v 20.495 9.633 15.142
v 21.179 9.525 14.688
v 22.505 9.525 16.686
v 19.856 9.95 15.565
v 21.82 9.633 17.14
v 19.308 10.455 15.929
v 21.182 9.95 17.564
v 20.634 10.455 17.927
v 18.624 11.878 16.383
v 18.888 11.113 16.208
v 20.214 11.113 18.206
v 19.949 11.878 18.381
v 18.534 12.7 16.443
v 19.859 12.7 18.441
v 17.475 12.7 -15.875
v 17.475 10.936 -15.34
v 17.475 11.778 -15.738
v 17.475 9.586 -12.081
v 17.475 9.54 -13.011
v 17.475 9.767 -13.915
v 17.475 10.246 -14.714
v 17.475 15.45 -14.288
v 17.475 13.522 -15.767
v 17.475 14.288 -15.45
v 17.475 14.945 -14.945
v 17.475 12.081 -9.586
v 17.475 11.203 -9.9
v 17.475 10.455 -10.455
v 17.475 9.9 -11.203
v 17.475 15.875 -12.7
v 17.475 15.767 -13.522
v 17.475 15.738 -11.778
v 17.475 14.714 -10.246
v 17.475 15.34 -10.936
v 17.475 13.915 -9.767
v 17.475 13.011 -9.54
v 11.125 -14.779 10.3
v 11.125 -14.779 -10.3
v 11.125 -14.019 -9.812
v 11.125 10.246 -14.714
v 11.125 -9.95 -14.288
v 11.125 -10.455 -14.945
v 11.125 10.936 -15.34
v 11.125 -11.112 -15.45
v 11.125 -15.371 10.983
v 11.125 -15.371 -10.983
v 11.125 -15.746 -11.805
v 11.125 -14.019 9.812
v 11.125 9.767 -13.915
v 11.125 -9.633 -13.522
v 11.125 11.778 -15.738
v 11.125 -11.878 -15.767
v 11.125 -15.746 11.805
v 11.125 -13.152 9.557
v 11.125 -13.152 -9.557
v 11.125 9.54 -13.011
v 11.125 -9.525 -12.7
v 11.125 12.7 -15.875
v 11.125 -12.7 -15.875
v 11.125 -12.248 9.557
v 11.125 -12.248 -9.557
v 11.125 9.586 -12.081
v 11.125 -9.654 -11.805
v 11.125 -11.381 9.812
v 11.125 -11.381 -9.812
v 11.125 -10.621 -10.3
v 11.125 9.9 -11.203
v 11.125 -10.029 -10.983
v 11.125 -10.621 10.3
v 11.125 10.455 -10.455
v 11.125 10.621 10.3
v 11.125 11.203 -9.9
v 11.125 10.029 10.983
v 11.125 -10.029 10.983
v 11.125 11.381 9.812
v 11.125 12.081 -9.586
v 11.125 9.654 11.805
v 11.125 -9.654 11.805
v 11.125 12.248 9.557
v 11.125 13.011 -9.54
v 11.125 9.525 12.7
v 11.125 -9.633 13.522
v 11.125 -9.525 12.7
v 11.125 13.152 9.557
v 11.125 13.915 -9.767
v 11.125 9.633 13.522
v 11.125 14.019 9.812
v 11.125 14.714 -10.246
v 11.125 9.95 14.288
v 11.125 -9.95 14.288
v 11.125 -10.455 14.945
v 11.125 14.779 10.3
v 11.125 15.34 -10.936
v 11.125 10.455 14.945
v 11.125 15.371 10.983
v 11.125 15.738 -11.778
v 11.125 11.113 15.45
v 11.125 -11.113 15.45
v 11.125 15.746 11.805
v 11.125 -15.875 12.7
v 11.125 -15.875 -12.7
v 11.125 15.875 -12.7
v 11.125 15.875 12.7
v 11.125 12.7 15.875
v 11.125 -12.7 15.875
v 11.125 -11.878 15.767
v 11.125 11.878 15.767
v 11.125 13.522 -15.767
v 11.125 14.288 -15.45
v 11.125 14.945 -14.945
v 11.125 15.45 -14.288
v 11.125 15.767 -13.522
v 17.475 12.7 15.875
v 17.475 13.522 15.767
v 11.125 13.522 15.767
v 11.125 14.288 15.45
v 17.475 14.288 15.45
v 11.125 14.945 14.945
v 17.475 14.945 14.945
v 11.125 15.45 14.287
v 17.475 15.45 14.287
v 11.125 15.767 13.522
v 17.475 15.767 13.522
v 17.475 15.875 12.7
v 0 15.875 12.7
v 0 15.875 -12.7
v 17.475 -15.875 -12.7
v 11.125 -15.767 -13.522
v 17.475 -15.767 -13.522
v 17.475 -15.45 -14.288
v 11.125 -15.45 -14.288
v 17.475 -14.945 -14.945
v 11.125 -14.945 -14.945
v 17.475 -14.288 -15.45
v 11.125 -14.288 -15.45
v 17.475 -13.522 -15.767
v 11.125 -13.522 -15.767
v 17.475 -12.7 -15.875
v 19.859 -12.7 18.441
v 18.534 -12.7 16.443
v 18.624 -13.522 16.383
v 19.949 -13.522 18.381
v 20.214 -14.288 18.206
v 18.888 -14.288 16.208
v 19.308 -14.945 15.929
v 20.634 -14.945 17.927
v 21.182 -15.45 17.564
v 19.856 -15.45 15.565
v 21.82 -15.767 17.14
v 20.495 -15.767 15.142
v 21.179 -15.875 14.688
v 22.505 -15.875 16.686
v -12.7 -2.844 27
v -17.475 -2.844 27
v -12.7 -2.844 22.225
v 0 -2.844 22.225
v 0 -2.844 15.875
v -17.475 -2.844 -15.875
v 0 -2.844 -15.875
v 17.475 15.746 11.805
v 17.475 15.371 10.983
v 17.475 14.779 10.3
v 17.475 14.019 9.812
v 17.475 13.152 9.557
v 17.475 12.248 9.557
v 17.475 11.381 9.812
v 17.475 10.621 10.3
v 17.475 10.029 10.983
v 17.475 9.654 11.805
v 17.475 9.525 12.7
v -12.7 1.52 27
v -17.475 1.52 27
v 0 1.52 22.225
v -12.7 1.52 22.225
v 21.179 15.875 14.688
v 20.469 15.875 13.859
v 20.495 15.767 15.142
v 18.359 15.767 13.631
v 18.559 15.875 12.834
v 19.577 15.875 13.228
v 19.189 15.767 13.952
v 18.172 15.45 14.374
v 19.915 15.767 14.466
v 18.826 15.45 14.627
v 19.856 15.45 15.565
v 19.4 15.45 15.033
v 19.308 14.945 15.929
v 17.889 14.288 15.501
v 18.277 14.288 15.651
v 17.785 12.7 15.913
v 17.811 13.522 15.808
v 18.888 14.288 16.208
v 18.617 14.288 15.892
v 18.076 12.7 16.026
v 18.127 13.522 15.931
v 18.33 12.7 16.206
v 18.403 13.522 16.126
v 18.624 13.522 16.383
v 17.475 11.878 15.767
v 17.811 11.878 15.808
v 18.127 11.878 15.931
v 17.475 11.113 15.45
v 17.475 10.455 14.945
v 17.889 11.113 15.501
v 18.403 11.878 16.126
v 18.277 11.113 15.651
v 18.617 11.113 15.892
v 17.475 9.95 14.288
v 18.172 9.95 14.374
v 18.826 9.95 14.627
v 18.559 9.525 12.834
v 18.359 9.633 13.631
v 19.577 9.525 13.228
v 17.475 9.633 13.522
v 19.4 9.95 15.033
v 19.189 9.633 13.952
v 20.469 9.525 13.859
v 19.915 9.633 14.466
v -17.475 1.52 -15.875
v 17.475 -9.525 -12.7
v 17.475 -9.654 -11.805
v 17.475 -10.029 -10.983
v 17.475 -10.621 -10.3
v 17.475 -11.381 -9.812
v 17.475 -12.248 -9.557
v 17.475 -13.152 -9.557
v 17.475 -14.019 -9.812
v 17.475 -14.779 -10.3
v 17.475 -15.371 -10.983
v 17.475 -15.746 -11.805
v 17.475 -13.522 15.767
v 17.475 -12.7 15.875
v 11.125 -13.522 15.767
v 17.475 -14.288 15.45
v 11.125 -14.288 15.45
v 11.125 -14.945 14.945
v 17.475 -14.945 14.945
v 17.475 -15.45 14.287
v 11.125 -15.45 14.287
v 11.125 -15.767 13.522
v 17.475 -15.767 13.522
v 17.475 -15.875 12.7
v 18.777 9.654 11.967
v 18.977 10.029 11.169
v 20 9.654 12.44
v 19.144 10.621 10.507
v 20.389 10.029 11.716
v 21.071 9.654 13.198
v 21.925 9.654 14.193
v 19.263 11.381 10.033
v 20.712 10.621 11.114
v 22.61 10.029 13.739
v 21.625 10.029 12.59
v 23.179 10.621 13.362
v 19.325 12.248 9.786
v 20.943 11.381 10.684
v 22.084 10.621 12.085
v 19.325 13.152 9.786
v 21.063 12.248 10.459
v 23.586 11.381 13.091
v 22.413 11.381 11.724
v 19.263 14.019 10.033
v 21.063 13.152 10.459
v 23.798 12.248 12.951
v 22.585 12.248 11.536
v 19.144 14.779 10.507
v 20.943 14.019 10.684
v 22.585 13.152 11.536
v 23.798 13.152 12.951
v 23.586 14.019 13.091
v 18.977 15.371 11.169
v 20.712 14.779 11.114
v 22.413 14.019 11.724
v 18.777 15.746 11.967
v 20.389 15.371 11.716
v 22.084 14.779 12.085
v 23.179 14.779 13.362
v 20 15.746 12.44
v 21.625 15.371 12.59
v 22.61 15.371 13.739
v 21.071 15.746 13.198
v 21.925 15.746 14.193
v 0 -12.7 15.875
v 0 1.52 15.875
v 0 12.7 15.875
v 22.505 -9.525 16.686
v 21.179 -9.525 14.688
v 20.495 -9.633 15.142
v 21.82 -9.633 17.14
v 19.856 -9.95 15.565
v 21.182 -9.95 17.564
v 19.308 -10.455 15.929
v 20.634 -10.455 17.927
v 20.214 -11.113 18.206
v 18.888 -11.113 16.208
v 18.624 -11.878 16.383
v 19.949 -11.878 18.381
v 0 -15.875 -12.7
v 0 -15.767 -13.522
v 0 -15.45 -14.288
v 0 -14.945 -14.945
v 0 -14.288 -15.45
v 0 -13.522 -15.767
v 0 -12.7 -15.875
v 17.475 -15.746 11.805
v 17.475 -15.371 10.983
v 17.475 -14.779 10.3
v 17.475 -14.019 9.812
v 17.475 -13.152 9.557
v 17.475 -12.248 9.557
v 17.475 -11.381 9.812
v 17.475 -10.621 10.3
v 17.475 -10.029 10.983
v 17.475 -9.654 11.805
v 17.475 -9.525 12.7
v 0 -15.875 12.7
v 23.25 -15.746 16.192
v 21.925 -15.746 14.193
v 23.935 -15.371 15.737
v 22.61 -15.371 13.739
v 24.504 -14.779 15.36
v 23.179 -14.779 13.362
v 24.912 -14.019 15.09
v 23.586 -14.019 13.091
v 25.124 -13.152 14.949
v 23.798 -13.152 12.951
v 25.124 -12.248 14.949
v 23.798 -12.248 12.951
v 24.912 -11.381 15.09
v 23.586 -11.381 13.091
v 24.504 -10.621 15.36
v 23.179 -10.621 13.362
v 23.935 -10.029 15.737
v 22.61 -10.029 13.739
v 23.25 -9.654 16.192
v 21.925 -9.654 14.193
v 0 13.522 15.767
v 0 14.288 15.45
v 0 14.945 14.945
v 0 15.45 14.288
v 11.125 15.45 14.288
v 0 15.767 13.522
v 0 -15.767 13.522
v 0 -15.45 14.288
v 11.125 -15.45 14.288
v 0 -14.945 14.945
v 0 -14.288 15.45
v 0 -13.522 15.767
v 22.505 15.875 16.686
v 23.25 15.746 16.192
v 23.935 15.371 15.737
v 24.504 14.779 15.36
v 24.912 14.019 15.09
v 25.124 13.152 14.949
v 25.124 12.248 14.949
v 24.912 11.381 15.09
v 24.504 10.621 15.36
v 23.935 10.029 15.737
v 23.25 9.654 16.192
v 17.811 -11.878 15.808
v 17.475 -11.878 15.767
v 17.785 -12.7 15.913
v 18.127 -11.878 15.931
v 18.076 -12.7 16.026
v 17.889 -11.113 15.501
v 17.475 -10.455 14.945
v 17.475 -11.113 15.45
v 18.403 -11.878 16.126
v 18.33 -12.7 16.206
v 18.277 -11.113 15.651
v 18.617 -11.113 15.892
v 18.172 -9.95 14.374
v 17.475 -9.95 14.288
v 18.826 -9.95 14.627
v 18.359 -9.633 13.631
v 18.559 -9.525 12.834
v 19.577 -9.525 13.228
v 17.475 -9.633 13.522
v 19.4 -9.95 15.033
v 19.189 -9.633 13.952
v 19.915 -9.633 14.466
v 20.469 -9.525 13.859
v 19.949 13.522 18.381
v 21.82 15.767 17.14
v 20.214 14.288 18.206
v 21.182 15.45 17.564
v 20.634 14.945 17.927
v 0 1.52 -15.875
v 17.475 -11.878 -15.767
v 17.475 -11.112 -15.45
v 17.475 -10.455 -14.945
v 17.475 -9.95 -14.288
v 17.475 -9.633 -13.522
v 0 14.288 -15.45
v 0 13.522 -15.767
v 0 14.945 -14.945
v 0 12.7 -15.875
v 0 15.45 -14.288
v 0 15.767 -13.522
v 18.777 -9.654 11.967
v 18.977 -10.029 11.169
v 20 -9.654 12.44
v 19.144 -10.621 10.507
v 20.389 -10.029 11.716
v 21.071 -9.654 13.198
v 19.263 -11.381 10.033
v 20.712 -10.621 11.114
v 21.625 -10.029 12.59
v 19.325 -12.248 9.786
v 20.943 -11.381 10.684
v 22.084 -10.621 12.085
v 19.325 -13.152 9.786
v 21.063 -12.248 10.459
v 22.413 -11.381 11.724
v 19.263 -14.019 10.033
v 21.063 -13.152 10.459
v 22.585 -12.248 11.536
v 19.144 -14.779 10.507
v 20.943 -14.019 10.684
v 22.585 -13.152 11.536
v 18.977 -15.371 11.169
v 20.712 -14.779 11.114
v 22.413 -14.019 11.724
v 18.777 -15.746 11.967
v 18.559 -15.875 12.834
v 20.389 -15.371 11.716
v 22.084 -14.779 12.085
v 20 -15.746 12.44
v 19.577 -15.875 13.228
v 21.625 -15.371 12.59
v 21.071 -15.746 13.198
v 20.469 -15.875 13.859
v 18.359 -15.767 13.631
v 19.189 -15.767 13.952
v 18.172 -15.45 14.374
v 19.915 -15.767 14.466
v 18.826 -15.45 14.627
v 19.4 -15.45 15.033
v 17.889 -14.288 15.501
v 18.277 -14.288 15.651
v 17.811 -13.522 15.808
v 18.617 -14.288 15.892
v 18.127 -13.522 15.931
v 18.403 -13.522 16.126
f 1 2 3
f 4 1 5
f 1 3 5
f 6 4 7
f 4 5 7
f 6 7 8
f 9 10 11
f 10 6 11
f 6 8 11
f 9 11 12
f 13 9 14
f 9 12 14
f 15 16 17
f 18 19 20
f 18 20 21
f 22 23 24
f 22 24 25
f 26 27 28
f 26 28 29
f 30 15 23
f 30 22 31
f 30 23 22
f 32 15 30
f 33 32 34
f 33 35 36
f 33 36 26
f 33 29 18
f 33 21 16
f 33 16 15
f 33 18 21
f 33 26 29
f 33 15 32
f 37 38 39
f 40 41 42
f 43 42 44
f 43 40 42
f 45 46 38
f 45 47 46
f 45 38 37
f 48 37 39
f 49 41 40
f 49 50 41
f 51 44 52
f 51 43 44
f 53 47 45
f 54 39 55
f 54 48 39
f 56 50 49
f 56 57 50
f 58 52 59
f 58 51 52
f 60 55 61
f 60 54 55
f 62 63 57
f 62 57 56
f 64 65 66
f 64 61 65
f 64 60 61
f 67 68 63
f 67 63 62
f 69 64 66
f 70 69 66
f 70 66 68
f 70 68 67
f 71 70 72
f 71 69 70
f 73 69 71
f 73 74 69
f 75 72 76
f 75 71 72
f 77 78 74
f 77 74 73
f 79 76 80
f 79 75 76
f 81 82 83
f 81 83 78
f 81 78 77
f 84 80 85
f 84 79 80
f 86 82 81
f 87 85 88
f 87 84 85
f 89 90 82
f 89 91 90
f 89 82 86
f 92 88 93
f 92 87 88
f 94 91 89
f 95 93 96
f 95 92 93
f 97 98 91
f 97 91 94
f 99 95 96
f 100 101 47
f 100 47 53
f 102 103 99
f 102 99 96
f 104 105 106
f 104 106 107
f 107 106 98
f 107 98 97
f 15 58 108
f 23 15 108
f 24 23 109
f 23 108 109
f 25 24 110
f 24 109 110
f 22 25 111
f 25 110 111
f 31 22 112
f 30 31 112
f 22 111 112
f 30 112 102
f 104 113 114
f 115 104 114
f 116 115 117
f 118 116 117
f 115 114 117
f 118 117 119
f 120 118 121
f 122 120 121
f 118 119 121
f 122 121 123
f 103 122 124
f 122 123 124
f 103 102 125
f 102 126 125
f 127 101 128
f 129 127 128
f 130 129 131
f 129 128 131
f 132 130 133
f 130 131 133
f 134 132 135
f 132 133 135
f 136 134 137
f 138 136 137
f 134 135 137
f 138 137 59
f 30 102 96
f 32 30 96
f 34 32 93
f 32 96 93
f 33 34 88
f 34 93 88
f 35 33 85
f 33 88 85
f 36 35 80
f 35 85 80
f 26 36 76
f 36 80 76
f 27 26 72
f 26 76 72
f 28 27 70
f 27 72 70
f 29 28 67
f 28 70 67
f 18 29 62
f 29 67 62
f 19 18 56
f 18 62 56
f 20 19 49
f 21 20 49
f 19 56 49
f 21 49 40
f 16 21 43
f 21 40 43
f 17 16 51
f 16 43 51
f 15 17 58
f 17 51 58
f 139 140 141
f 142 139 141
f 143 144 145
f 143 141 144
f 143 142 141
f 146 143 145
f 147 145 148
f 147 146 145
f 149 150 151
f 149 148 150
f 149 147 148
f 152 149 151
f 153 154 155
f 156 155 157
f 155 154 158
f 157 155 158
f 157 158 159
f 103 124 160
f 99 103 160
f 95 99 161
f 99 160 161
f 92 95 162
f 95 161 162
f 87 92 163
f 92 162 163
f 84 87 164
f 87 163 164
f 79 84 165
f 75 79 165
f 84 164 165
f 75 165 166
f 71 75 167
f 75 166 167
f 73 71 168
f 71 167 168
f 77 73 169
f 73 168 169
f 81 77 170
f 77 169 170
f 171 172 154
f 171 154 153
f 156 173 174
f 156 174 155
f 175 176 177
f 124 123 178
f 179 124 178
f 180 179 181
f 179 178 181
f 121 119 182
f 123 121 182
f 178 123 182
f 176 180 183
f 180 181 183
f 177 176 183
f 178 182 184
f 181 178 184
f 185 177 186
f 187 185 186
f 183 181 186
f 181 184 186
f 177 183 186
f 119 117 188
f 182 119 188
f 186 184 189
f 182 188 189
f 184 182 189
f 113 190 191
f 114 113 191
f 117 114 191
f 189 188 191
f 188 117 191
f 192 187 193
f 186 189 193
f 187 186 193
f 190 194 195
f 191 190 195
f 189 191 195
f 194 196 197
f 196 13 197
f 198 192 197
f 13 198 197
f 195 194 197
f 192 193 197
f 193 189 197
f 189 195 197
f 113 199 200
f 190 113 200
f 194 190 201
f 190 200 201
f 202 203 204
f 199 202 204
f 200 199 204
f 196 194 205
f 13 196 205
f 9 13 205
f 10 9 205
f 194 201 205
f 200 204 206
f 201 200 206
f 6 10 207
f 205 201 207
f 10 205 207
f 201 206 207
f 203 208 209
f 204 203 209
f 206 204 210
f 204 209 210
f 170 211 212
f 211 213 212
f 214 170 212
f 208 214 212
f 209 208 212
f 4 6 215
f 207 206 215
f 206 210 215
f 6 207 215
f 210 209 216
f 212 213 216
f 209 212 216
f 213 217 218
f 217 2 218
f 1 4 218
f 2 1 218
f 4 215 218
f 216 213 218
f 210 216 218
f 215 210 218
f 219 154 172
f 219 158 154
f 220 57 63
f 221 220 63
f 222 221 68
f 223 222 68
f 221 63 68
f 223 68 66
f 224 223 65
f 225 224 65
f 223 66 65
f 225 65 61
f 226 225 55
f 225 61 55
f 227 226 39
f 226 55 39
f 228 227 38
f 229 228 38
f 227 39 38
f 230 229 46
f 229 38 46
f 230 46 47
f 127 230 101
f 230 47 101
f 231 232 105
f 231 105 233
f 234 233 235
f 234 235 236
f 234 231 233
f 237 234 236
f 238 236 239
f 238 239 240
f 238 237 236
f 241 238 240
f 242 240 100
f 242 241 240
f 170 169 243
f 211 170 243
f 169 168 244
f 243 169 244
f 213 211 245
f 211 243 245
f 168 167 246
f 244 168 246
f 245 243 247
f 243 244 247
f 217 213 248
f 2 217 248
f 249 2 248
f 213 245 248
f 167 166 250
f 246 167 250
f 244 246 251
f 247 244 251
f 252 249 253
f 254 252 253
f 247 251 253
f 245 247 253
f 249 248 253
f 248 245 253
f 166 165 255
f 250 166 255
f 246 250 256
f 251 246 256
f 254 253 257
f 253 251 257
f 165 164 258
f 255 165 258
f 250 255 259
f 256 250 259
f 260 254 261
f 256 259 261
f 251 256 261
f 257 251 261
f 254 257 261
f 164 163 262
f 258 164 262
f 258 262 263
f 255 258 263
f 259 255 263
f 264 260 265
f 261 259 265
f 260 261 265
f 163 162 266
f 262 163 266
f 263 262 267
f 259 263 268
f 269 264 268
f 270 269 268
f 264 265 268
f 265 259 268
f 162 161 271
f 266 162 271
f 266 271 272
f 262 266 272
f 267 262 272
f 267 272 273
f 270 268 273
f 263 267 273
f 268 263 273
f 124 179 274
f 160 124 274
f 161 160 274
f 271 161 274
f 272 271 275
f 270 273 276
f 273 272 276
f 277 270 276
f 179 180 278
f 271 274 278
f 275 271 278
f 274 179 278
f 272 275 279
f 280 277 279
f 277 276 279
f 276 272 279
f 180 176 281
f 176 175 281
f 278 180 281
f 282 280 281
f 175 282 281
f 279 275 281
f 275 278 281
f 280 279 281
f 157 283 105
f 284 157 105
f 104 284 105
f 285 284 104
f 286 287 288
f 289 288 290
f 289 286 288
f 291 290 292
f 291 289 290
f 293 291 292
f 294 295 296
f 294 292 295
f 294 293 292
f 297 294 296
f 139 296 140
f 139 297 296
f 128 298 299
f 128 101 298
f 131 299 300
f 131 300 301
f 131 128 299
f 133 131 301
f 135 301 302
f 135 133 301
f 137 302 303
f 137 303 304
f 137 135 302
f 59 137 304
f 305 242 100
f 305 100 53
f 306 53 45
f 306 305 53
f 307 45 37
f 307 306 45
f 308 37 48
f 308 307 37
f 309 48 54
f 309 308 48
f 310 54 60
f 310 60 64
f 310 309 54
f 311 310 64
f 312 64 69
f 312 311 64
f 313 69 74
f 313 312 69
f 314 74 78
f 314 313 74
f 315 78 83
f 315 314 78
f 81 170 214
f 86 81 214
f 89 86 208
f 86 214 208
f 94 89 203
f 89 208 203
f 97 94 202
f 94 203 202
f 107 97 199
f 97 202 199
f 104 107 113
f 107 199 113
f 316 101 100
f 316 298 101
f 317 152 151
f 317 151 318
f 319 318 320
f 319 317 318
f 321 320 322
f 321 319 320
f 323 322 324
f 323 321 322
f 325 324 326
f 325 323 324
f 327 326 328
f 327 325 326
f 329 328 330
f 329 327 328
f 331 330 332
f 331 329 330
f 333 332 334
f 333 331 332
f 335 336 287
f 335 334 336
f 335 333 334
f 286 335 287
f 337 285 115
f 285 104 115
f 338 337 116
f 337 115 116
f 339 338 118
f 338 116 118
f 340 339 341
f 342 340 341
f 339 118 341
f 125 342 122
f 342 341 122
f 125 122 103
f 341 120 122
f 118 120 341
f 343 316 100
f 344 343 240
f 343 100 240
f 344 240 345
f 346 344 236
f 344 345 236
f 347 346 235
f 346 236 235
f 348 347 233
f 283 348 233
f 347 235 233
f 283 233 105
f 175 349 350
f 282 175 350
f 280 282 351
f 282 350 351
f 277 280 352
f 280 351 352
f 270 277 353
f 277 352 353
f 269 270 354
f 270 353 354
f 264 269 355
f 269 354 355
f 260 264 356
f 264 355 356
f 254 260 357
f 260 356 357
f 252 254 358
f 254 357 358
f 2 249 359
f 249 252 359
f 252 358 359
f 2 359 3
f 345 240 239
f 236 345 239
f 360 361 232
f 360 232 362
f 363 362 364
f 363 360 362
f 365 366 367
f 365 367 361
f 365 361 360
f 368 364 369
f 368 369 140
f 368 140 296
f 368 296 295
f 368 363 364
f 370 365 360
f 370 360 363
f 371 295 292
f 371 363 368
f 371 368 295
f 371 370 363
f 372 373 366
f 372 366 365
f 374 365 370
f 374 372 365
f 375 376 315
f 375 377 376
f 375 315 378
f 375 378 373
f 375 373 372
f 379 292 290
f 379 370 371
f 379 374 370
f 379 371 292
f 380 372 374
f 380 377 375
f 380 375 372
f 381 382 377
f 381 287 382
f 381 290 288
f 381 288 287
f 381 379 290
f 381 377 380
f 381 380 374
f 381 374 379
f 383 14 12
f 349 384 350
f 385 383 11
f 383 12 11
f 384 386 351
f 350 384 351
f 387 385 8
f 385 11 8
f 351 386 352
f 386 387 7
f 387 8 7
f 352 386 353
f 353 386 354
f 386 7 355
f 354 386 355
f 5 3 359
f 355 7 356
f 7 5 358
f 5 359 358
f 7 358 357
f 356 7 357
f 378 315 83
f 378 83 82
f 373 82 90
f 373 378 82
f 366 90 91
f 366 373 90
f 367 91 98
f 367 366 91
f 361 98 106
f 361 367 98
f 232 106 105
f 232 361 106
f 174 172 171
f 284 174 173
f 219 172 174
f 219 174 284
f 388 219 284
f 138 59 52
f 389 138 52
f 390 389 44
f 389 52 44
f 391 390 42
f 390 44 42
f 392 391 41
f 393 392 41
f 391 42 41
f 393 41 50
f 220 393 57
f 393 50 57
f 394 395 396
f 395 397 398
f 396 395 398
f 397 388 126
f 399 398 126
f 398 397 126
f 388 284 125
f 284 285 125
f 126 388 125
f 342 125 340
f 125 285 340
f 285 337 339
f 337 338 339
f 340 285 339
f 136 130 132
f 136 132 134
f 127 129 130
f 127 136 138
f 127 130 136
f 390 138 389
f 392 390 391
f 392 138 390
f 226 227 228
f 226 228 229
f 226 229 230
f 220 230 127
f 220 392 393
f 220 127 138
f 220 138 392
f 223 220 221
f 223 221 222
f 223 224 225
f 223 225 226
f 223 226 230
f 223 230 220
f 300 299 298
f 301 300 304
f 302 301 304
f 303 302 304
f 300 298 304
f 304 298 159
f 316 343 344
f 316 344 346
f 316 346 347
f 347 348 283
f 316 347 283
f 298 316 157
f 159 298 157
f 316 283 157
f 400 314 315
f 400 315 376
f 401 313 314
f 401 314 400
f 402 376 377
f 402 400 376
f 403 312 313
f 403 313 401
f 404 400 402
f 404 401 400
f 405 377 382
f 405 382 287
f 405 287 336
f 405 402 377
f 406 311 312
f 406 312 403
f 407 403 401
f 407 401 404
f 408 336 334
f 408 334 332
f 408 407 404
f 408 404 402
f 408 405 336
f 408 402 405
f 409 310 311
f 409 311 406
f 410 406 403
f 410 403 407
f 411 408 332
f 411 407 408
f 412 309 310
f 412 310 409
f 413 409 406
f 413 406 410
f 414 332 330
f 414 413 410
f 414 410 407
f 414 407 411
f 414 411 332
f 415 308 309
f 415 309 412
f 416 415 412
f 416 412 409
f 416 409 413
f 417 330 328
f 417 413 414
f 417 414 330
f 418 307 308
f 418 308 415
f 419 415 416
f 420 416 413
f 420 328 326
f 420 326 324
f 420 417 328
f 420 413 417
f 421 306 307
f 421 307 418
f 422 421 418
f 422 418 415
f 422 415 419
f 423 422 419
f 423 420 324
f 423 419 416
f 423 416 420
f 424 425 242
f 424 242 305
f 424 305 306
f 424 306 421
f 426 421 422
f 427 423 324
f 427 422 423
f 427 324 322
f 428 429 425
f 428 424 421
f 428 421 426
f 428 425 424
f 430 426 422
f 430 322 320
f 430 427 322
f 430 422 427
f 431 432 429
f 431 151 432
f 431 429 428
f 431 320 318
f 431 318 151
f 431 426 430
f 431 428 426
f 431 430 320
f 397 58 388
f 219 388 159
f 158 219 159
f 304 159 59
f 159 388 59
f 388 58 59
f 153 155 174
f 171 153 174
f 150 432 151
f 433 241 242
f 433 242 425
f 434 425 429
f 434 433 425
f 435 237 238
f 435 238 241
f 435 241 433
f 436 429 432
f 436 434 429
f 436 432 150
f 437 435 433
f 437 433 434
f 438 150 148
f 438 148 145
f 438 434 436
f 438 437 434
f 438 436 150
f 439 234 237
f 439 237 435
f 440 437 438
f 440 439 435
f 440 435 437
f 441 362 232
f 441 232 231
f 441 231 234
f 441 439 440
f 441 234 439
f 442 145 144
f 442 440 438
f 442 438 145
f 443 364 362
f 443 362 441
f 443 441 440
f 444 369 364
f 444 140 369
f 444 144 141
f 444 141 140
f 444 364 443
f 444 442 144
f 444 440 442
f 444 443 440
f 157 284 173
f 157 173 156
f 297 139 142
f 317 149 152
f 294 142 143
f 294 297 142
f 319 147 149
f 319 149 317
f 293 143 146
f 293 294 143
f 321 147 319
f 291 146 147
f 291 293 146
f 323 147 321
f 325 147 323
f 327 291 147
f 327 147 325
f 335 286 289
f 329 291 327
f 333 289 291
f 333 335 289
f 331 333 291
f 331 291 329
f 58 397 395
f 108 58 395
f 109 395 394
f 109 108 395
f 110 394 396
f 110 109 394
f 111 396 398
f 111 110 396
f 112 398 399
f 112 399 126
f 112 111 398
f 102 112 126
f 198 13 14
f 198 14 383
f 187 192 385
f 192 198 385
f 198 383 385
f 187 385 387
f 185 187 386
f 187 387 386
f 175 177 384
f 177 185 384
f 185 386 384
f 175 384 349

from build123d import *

# Parameters (mm, degrees)
F0_W      = 31.75
F0_H      = 31.75
F1_DEPTH  = 11.1252
F10_DEPTH = 6.35
F11_R     = 3.1749
F12_W     = 4.36372
F12_H     = 6.35
F12_H_2   = 31.75
F13_DEPTH = 17.4752
F14_W     = 4.7752
F14_H     = 4.36372
F15_DEPTH = 4.7752


# Not quite as in the source:
# - a fillet or chamfer is up to 0.001 mm smaller than in the source, because OpenCascade refuses the exact size


with BuildPart() as f1:
    # F0 (on Right) → F1 (new body)
    with BuildSketch(Plane.YZ):
        Rectangle(F0_W, F0_H)
    extrude(amount=F1_DEPTH)

    # F6: sweep along a path in F5
    with BuildLine(Plane.XZ.offset(12.7)) as f6_path:
        Line((11.1252, 9.525), (17.4752, 9.525))
        ThreePointArc((17.4752, 9.525), (21.0785384003, 10.4308096264), (23.8252, 12.9328865162))
        Line((23.8252, 12.9328865162), (25.1507334947, 14.9312034475))
    # F2 (on face) → F6 (sweep)
    with BuildSketch(Plane.YZ.offset(11.1252)):
        with BuildLine():
            ThreePointArc((-15.875, 12.7), (-12.7, 9.525), (-9.525, 12.7))
            ThreePointArc((-9.525, 12.7), (-10.4549359718, 14.9450640323), (-12.7000000057, 15.875))
            ThreePointArc((-12.7000000057, 15.875), (-14.9450640323, 14.9450640282), (-15.875, 12.7))
        make_face()
    sweep(path=f6_path.line)

    # F9: F1 across plane


with BuildPart() as f1_1:
    add(f1.part)
    add(f1.part.mirror(Plane(origin=(0, 0, 15.875), x_dir=(1, 0, 0), z_dir=(0, -1, 0))))

    # F2 (on face) → F10 (join)
    with BuildSketch(Plane.YZ.offset(11.1252)):
        with BuildLine():
            ThreePointArc((-9.525, -12.7), (-12.7, -9.525), (-15.875, -12.7))
            ThreePointArc((-15.875, -12.7), (-14.9450640303, -14.9450640303), (-12.7, -15.875))
            ThreePointArc((-12.7, -15.875), (-10.4549359697, -14.9450640303), (-9.525, -12.7))
        make_face()
        with BuildLine():
            ThreePointArc((12.7, -15.875), (14.9450640303, -14.9450640303), (15.875, -12.7))
            ThreePointArc((15.875, -12.7), (10.4549359697, -10.4549359697), (12.7, -15.875))
        make_face()
    extrude(amount=F10_DEPTH)

    # F11 (radius 3.175 in the source; OpenCascade refuses exactly that, so slightly less here)
    f11_edges = [f1_1.edges().sort_by_distance(p)[0] for p in [
        (5.5626, -15.875, 15.875),
        (5.5626, -15.875, -15.875),
        (5.5626, 15.875, -15.875),
        (5.5626, 15.875, 15.875),
    ]]
    fillet(f11_edges, radius=F11_R)

    # F12 (on face) → F13 (join)
    with BuildSketch(Plane(origin=(0, 0, 0), x_dir=(0, -1, 0), z_dir=(-1, 0, 0))):
        with Locations((0.6621663562, 19.05)):
            Rectangle(F12_W, F12_H)
        with Locations((0.6621663562, 0)):
            Rectangle(F12_W, F12_H_2)
    extrude(amount=F13_DEPTH)

    # F14 (on face) → F15 (join)
    with BuildSketch(Plane.XY.offset(22.225)):
        with Locations((-15.0876, -0.6621663562)):
            Rectangle(F14_W, F14_H)
    extrude(amount=F15_DEPTH)


solid = f1_1.part
